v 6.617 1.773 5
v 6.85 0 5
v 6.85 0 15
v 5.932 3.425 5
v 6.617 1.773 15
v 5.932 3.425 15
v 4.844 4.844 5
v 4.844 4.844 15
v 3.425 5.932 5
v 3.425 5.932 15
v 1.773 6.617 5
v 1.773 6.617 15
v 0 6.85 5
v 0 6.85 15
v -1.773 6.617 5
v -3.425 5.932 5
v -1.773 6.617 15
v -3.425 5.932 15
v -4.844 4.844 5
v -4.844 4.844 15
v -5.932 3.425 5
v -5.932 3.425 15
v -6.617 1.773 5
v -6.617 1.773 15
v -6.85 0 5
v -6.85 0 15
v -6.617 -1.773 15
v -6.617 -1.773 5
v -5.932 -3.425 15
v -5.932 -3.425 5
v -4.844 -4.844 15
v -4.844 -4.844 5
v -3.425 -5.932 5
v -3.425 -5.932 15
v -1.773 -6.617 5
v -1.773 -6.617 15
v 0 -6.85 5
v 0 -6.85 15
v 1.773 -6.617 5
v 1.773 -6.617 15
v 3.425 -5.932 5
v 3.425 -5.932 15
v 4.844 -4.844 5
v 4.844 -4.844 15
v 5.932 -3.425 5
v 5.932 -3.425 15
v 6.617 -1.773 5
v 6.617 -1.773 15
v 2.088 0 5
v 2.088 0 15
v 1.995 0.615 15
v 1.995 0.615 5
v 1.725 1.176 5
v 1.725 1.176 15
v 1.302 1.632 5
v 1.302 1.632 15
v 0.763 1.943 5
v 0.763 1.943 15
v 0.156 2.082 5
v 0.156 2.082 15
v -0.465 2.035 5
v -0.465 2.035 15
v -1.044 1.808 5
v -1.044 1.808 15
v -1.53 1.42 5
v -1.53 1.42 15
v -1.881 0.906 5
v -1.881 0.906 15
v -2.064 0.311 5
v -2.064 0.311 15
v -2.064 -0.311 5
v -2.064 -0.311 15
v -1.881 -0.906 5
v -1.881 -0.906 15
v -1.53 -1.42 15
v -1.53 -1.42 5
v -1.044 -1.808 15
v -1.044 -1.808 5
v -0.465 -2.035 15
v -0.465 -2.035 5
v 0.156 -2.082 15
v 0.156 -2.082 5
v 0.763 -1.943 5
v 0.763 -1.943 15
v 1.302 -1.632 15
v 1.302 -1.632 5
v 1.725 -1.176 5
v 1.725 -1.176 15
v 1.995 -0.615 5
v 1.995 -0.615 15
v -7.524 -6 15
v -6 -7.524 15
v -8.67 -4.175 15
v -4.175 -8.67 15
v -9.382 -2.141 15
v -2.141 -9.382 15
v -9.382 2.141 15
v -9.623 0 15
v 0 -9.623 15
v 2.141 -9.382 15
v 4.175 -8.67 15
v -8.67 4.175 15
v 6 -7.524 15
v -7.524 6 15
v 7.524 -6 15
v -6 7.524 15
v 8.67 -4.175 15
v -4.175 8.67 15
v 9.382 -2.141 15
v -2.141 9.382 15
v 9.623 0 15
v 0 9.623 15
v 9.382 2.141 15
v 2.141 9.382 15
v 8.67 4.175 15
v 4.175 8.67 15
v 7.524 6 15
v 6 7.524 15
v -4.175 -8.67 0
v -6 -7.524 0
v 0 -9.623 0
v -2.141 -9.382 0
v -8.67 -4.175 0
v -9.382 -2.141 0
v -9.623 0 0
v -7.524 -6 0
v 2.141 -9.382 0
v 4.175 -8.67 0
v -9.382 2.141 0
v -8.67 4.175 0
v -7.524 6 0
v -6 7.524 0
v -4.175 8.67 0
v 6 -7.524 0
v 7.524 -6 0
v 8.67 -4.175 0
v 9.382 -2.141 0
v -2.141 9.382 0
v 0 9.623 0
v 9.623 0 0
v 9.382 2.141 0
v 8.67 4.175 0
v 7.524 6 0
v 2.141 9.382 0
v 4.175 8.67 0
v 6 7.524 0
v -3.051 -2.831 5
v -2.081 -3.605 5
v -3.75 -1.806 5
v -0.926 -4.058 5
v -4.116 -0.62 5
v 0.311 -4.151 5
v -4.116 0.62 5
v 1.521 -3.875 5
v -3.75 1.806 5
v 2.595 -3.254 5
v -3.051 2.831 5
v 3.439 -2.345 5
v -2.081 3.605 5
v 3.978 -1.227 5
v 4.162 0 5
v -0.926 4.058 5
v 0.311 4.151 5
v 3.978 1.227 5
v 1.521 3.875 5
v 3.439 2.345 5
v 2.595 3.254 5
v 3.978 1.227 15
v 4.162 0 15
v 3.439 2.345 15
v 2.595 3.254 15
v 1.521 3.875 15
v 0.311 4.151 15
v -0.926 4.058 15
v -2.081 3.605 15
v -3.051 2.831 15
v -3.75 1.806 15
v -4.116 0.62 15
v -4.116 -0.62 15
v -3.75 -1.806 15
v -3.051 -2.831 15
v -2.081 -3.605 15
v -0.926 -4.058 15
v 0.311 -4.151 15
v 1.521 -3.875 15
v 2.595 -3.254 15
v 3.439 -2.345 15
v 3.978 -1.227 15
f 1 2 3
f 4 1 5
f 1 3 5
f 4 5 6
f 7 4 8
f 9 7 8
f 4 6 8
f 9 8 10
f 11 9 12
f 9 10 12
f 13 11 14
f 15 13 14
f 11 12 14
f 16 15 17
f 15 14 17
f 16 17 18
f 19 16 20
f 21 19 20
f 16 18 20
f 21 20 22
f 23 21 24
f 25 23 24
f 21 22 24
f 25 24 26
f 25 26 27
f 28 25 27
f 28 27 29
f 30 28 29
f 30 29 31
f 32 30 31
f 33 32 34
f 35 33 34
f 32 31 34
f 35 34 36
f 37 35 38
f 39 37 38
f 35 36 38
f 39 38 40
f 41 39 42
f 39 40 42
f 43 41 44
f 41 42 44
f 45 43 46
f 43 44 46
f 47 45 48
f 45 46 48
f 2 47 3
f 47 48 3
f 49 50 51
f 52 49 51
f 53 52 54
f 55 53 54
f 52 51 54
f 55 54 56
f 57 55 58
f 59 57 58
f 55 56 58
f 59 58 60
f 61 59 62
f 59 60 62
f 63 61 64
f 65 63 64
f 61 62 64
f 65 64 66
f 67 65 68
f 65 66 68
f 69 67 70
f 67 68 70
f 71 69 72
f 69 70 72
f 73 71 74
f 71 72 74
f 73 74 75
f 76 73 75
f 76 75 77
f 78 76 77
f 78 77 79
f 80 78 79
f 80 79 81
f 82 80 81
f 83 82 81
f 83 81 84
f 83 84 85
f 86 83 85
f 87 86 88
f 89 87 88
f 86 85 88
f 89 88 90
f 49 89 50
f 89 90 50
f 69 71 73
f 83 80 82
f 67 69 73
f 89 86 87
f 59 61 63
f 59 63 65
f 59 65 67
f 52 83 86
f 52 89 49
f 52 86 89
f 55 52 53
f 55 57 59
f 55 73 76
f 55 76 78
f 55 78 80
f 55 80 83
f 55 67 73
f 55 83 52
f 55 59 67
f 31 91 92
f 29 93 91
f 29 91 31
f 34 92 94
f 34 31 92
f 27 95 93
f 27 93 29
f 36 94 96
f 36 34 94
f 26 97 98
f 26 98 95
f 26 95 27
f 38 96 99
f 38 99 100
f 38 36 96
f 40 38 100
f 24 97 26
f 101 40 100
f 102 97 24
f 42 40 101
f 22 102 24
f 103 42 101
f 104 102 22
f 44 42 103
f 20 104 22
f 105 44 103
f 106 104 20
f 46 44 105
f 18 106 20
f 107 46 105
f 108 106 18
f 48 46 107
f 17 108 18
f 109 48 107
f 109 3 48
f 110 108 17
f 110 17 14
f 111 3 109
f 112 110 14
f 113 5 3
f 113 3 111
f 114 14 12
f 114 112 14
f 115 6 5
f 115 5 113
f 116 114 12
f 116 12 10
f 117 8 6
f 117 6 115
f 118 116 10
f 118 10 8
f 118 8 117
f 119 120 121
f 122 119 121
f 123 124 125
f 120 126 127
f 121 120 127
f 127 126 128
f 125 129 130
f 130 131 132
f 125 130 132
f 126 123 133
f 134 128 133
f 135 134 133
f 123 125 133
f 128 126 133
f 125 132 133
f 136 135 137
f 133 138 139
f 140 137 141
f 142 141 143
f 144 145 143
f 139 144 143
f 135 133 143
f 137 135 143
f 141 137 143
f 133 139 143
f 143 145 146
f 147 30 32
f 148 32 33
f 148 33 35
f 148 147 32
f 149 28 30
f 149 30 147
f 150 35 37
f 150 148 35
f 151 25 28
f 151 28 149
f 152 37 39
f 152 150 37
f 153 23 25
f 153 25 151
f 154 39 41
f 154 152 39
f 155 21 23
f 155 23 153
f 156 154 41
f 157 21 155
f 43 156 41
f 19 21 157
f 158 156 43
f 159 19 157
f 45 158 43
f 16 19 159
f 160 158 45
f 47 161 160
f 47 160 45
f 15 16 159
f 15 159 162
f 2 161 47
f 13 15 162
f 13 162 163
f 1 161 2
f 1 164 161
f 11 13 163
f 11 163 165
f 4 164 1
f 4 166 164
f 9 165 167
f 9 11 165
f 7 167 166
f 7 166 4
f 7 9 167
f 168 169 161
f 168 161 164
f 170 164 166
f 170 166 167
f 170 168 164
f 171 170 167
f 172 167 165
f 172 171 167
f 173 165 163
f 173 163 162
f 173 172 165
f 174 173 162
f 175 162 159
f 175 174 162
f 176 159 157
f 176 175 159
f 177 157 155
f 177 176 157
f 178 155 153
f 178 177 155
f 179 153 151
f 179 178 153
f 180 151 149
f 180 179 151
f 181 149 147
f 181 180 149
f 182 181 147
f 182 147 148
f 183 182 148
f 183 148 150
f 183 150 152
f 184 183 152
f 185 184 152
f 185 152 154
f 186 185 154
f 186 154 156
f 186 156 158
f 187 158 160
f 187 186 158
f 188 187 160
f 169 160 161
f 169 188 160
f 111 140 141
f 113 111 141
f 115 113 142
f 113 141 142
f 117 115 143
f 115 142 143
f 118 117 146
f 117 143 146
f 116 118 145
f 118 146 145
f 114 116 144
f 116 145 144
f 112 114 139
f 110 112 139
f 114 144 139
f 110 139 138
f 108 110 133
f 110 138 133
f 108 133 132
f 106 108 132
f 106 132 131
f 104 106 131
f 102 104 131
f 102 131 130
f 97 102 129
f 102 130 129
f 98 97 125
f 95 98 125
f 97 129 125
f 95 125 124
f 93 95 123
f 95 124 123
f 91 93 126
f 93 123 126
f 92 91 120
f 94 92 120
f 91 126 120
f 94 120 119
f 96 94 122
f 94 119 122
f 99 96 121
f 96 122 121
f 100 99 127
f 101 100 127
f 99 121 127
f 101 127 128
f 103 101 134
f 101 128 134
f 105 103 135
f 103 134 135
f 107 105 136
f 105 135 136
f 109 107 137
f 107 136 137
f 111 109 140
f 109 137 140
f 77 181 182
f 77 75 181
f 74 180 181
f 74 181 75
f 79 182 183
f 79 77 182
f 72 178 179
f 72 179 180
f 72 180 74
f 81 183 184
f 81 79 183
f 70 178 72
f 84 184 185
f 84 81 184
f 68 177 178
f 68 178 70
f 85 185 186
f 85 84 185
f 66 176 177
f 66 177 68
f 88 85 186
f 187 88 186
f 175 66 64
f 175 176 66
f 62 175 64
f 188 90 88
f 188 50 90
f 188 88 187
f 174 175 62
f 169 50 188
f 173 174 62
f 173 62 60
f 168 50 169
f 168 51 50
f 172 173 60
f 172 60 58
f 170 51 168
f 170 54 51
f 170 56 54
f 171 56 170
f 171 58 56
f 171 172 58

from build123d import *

# Parameters (mm, degrees)
F0_R     = 9.623
F1_DEPTH = 15
F2_R     = 2.0875
F3_DEPTH = 10
F2_R_2   = 6.85
F2_R_3   = 4.1625
F4_DEPTH = 10


# Not quite as in the source:
# - a feature names something its author has since deleted; it is built from what else it names


with BuildPart() as f1:
    # F0 (on Top) → F1 (new body)
    with BuildSketch(Plane.XY):
        Circle(F0_R)
    extrude(amount=F1_DEPTH)

    # F2 (on face) → F3 (cut)
    with BuildSketch(Plane.XY.offset(15)):
        Circle(F2_R)
    extrude(amount=-F3_DEPTH, mode=Mode.SUBTRACT)

    # F2 (on face) → F4 (cut)
    with BuildSketch(Plane.XY.offset(15)):
        Circle(F2_R_2)
        Circle(F2_R_3, mode=Mode.SUBTRACT)
    extrude(amount=-F4_DEPTH, mode=Mode.SUBTRACT)


solid = f1.part
